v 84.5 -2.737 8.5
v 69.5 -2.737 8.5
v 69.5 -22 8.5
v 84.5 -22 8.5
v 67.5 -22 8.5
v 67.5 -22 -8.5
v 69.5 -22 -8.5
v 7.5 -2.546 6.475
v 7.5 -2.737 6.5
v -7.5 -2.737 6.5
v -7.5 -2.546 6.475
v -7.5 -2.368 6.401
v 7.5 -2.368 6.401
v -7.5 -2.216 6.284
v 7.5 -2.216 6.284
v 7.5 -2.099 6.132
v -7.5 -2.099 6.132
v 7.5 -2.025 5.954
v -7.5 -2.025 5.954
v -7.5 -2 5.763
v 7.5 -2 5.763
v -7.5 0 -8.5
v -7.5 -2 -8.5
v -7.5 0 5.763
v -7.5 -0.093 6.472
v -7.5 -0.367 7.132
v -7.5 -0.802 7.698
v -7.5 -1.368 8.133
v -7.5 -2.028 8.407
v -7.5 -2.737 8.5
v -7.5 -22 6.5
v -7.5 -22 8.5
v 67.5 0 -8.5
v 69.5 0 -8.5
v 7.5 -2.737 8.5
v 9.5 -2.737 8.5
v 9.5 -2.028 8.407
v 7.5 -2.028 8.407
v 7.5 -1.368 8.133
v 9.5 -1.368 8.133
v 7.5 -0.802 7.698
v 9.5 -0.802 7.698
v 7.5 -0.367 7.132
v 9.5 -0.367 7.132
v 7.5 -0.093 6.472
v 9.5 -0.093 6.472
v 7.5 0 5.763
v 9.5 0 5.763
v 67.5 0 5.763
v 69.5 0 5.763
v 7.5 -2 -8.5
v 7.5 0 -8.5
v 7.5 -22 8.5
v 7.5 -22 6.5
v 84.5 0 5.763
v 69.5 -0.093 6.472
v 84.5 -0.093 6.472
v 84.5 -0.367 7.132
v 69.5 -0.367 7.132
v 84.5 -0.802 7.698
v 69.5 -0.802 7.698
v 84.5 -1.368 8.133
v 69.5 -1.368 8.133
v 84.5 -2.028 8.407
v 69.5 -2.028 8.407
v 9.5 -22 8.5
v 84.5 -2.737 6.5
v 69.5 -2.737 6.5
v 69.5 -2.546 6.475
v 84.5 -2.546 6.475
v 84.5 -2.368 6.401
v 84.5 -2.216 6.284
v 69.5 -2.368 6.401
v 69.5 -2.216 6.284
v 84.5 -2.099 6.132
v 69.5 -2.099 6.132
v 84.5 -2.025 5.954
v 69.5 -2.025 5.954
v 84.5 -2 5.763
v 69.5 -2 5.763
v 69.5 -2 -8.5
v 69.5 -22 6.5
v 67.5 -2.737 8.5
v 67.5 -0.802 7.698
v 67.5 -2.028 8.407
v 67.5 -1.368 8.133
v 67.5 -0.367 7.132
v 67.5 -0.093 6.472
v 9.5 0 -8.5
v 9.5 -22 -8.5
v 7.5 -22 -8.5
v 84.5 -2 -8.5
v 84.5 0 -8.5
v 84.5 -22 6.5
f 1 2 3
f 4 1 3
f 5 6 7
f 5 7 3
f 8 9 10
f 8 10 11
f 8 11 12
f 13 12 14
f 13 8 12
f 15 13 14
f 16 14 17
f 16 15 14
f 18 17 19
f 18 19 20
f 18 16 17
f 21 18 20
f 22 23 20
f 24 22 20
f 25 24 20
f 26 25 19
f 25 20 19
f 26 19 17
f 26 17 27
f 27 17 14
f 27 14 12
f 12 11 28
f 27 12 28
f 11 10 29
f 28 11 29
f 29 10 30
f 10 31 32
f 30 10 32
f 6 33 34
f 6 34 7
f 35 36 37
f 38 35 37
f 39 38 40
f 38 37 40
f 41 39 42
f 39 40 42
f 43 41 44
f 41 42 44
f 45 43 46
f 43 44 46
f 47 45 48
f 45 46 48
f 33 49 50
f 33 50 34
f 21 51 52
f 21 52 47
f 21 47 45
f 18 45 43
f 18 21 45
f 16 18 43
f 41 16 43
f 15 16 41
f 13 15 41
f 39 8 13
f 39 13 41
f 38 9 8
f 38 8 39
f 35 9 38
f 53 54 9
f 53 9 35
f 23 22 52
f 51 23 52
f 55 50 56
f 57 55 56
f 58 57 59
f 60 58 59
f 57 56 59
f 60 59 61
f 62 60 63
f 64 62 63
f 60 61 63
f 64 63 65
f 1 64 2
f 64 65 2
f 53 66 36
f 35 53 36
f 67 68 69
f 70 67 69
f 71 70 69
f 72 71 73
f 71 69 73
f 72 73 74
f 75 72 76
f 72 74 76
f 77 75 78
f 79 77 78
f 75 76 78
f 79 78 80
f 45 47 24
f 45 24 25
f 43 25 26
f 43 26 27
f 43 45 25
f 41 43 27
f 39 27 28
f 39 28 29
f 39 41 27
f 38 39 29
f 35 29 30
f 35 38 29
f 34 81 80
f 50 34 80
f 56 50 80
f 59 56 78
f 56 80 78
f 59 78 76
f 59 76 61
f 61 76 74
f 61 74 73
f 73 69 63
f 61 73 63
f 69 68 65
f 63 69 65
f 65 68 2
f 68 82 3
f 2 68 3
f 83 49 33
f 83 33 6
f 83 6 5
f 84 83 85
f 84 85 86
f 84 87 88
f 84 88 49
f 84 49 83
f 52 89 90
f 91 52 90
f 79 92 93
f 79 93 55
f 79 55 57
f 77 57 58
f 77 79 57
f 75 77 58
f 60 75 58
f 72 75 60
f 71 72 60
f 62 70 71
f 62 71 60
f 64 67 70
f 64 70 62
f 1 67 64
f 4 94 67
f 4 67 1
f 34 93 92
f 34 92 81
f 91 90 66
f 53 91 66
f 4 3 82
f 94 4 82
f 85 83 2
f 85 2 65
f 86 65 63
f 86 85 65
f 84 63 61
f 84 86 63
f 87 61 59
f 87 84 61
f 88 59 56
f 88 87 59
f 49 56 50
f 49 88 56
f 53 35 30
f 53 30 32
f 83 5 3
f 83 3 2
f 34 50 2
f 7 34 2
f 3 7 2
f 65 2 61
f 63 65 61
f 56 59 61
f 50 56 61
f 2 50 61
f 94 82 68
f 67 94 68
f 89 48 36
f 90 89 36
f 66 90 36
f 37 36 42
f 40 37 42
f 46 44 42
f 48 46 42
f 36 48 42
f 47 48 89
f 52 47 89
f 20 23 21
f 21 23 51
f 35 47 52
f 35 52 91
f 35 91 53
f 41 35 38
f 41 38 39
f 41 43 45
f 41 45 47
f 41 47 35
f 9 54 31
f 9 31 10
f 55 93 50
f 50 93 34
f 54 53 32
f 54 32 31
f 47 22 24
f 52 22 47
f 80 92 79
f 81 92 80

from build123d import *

# Parameters (mm, degrees)
SKETCH1_W                    = 15
SKETCH1_H                    = 17
BASE_FLANGE1_DEPTH           = 2
EDGE_FLANGE1_STRIP_W         = 9.4732
EDGE_FLANGE1_STRIP_H         = 2
EDGE_FLANGE1_STRIP_CUT_DEPTH = 15
EDGE_FLANGE1_DEPTH           = 15
BASE_FLANGE2_START           = 2
BASE_FLANGE2_DEPTH           = 2


# Sheet-metal steps are written as plain solids
with BuildPart() as part:
    # Sketch1 → Base-Flange1 (new body)
    with BuildSketch(Plane(origin=(0, 0, 0), x_dir=(1, 0, 0), z_dir=(0, 1, 0))):
        Rectangle(SKETCH1_W, SKETCH1_H)
    extrude(amount=-BASE_FLANGE1_DEPTH)

    # Edge-Flange1 strip (across the edge) → Edge-Flange1 strip cut (cut)
    with BuildSketch(Plane(origin=(7.5, -2, 8.5), x_dir=(0, 0, -1), z_dir=(-1, 0, 0))):
        with Locations((-2, -1)):
            Rectangle(EDGE_FLANGE1_STRIP_W, EDGE_FLANGE1_STRIP_H)
    extrude(amount=EDGE_FLANGE1_STRIP_CUT_DEPTH, mode=Mode.SUBTRACT)

    # Edge-Flange1 section (across the edge) → Edge-Flange1 (add)
    with BuildSketch(Plane(origin=(7.5, -2, 8.5), x_dir=(0, 0, -1), z_dir=(-1, 0, 0))):
        with BuildLine():
            Line((0, 0.7366), (0, 20))
            Line((0, 20), (2, 20))
            Line((2, 20), (2, 0.7366))
            ThreePointArc((2, 0.7366), (2.215745145, 0.215745145), (2.7366, 0))
            Line((2.7366, 0), (2.7366, -2))
            ThreePointArc((2.7366, -2), (0.801531583, -1.198468417), (0, 0.7366))
        make_face()
    extrude(amount=EDGE_FLANGE1_DEPTH)


with BuildPart() as body_2:
    # Sketch9 → Base-Flange2 (new body)
    with BuildSketch(Plane(origin=(7.5, 0, 0), x_dir=(0, 0, -1), z_dir=(1, 0, 0)).offset(BASE_FLANGE2_START)):
        with BuildLine():
            Line((-8.5, -22), (-8.5, -2.7366))
            ThreePointArc((-8.5, -2.7366), (-7.698468417, -0.801531583), (-5.7634, 0))
            Line((-5.7634, 0), (8.5, 0))
            Line((8.5, 0), (8.5, -22))
            Line((8.5, -22), (-8.5, -22))
        make_face()
    extrude(amount=-BASE_FLANGE2_DEPTH)


with BuildPart() as body_3:
    # Mirror1: mirrored copy
    add(part.part.mirror(Plane.ZY.offset(-38.5)))


with BuildPart() as body_4:
    # Mirror1 2: mirrored copy
    add(body_2.part.mirror(Plane.ZY.offset(-38.5)))


solid = Compound([part.part, body_2.part, body_3.part, body_4.part])
